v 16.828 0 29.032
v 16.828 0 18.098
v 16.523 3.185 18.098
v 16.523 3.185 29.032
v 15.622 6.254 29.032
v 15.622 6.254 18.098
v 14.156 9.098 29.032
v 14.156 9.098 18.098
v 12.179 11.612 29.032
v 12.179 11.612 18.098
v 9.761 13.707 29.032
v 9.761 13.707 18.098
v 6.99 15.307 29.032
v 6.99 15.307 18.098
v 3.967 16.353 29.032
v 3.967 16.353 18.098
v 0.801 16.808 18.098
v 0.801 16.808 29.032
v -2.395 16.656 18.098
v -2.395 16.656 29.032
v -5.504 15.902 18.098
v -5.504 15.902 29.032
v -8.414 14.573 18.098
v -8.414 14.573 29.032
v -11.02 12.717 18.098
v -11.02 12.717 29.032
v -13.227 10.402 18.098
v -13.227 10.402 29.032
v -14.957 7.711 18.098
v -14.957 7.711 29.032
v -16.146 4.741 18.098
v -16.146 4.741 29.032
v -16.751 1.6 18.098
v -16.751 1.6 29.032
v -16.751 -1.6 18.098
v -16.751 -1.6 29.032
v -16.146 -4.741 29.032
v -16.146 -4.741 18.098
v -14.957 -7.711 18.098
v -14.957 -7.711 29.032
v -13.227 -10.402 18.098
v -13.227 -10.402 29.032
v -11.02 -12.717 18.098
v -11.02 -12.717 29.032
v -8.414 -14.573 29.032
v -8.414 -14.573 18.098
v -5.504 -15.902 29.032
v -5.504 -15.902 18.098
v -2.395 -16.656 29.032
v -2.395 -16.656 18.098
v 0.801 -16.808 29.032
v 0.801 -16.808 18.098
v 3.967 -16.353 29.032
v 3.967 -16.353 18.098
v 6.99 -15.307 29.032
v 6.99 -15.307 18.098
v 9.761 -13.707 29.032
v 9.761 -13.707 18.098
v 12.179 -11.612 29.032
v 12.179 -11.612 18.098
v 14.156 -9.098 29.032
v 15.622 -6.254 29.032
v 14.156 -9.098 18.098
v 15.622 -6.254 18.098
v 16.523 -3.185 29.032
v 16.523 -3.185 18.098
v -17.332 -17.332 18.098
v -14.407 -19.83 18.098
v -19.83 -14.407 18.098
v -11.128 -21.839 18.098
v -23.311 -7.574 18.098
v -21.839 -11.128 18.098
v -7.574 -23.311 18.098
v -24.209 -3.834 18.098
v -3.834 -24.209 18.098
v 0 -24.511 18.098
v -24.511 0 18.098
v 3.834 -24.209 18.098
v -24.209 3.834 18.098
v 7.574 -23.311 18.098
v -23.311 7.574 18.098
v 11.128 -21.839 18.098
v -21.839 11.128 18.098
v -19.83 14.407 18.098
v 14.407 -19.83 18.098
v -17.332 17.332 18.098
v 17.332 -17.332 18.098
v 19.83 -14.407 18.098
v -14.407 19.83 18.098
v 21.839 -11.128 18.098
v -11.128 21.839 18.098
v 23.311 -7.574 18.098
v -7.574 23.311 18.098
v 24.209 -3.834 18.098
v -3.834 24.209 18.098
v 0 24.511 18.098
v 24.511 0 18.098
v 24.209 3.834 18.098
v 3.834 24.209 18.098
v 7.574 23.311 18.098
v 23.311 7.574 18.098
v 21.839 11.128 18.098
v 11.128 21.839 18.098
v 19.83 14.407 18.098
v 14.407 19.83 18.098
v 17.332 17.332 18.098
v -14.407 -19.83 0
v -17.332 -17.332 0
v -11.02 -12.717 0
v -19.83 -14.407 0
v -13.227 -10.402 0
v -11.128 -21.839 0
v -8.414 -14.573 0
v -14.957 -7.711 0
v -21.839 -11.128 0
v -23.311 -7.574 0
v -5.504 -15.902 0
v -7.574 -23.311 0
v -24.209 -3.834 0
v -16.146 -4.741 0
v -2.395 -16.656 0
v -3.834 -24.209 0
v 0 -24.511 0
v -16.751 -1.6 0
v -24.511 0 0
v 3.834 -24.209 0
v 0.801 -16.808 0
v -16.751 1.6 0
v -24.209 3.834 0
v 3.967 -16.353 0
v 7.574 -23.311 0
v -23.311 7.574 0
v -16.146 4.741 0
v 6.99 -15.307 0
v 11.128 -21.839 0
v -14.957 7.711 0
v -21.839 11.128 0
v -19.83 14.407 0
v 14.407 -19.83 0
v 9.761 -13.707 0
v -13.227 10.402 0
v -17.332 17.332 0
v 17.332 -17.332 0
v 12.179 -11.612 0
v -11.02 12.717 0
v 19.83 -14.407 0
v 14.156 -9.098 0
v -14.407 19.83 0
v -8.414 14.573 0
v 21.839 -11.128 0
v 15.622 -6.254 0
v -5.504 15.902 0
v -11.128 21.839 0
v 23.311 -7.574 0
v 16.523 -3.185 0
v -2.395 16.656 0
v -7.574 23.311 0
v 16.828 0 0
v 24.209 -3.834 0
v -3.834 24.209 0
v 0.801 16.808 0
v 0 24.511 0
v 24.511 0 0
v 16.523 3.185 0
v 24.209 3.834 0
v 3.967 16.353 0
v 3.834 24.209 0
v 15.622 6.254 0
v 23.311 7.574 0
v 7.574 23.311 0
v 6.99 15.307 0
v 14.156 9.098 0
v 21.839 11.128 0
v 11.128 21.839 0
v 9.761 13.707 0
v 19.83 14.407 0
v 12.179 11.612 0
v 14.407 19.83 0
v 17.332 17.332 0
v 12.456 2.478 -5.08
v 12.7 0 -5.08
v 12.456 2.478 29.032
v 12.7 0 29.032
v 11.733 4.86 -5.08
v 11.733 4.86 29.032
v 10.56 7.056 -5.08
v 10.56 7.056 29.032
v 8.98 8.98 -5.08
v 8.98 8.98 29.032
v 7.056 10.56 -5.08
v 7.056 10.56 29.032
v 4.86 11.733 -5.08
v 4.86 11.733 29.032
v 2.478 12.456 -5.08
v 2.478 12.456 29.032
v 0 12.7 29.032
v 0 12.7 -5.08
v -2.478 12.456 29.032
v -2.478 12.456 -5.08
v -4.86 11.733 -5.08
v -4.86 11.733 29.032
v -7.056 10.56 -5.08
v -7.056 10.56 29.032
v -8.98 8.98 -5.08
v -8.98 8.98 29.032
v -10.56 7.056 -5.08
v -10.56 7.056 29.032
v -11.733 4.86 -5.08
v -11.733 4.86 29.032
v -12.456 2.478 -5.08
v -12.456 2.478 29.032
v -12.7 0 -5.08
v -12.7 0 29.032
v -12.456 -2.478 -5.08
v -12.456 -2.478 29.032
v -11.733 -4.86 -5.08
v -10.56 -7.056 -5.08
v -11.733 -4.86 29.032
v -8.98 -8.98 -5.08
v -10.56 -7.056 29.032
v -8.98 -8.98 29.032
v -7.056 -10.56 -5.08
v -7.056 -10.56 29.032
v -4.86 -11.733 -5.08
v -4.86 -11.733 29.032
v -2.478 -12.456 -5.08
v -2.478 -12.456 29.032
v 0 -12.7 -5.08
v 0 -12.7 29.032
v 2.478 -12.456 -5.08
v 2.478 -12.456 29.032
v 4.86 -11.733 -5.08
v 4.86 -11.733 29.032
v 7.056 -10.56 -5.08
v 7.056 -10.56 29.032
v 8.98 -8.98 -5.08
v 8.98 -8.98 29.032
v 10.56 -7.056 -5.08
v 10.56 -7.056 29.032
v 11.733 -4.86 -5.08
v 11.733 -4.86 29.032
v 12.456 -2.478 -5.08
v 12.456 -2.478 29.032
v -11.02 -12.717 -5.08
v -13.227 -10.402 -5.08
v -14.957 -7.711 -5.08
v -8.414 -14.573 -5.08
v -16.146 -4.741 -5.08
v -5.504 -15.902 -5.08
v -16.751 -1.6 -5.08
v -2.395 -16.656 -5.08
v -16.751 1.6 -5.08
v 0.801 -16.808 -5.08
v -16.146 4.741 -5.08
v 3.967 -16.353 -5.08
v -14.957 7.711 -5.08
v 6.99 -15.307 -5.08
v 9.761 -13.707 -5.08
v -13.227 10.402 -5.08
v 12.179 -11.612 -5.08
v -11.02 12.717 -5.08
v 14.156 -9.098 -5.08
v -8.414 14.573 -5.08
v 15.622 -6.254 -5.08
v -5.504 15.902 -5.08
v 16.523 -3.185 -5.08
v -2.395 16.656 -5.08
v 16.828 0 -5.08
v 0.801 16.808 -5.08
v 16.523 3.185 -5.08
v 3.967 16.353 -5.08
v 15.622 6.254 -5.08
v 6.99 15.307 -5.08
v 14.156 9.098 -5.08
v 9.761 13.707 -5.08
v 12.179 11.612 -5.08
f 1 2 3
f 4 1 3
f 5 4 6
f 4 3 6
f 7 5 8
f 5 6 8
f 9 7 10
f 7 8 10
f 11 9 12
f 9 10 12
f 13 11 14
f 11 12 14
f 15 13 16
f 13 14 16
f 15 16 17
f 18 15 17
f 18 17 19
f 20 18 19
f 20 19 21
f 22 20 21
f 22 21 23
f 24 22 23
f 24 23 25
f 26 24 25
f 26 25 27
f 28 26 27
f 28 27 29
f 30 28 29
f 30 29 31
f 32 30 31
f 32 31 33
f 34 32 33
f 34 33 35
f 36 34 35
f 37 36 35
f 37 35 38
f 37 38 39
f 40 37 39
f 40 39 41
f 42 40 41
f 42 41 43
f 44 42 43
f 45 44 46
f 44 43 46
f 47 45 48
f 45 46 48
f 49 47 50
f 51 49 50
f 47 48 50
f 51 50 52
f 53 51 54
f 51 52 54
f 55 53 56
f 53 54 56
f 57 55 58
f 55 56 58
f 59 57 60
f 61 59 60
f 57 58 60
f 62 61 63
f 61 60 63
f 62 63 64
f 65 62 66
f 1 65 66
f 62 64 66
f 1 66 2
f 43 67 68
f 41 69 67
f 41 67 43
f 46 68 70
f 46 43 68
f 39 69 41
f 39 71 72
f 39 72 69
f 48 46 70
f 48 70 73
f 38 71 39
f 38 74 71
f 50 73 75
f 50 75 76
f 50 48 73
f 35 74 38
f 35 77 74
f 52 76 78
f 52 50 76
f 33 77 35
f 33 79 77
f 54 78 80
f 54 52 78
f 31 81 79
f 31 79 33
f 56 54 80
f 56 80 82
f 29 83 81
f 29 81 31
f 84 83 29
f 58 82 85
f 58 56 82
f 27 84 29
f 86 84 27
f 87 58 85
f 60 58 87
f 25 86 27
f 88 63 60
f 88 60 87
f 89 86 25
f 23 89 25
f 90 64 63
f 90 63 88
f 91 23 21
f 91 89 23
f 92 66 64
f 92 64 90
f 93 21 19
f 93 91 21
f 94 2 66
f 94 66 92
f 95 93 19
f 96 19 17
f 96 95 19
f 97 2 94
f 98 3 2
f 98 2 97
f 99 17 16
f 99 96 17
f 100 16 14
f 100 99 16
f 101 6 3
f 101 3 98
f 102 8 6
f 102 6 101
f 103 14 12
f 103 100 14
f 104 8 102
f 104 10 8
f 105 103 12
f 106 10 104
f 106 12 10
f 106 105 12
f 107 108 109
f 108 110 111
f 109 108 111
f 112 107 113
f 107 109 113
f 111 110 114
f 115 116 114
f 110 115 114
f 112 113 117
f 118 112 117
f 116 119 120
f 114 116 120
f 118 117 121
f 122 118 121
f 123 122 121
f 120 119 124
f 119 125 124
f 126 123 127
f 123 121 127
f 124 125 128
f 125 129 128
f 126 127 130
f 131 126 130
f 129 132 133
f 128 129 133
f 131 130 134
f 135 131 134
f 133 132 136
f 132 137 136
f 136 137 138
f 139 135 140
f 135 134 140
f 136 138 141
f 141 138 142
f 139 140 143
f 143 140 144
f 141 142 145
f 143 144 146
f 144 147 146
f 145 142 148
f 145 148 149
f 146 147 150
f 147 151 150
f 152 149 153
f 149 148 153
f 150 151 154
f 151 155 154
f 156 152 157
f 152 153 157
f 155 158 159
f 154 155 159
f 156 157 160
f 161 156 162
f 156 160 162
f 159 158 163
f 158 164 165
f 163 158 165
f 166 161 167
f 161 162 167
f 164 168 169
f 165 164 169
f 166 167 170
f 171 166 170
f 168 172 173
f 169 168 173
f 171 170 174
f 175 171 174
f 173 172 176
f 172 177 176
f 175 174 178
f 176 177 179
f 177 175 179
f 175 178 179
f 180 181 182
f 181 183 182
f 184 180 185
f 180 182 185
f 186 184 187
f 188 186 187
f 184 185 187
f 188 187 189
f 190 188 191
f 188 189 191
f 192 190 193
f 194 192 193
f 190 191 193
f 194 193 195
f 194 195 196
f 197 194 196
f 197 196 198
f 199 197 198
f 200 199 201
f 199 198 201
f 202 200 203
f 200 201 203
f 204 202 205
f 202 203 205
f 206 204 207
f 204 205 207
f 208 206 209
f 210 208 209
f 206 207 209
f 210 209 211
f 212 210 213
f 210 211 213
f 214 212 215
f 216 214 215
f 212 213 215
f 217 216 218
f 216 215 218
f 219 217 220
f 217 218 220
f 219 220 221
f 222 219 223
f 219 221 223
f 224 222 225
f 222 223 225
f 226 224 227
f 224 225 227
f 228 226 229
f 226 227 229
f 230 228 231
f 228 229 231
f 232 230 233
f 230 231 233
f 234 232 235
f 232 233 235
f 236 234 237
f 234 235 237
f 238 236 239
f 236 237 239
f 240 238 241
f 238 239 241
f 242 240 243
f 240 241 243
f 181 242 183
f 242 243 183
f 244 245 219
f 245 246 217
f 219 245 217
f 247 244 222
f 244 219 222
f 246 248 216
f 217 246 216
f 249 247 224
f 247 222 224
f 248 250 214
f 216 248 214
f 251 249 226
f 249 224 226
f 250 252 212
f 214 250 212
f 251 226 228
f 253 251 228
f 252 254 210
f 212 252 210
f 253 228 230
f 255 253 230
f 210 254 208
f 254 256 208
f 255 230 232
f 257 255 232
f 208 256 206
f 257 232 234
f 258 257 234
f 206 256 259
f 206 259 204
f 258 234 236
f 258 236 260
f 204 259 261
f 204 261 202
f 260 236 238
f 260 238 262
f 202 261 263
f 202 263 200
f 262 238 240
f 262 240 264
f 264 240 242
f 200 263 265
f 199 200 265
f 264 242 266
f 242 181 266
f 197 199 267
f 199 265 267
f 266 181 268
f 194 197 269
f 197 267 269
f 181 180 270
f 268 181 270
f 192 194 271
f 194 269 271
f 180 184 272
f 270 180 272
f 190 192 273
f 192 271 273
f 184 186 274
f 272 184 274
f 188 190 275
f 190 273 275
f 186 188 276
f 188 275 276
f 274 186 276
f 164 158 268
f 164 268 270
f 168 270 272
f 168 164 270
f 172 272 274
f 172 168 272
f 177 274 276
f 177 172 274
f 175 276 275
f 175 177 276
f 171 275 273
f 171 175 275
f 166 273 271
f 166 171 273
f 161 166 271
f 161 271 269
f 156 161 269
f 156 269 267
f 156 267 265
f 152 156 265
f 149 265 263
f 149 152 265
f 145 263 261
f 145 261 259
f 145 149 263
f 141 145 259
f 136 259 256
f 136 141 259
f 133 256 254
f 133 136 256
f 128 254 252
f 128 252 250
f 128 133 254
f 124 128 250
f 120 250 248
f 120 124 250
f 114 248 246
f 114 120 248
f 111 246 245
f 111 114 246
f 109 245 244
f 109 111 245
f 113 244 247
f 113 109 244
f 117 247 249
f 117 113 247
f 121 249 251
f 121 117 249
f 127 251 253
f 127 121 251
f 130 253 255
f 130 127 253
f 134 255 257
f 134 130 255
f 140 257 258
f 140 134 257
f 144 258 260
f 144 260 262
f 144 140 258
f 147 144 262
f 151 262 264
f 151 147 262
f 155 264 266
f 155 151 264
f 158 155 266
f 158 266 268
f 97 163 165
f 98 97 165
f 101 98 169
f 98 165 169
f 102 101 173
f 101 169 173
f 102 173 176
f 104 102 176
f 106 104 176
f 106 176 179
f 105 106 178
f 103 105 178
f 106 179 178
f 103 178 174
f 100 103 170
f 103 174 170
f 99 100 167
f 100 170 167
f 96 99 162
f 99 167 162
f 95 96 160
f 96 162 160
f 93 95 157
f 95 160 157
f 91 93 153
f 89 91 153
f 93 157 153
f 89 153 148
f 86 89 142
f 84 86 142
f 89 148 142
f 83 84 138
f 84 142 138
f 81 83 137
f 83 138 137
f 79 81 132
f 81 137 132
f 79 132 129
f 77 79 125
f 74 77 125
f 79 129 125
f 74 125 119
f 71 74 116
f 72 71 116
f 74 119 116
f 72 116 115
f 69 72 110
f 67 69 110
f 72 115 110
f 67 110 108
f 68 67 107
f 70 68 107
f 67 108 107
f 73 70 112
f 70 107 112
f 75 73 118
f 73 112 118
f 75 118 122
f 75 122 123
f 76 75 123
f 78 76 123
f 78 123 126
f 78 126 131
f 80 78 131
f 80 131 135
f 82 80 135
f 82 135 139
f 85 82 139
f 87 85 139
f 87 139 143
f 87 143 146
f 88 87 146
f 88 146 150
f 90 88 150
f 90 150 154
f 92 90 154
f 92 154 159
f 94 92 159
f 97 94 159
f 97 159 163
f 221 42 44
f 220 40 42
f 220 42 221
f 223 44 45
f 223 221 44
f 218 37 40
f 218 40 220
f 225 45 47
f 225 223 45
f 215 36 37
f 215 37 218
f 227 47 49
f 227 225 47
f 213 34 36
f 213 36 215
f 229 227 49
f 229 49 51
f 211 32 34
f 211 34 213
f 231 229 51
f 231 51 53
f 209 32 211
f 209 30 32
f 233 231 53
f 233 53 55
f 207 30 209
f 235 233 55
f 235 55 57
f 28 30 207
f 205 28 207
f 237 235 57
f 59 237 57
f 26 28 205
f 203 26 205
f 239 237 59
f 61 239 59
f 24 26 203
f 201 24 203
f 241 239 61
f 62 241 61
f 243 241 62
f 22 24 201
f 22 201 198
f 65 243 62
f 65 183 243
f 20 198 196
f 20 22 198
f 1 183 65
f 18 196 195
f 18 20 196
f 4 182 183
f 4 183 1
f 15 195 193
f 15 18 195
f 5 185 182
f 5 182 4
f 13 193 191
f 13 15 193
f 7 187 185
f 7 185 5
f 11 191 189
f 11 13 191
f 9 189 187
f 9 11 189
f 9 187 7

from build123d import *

# Parameters (mm, degrees)
F0_R          = 24.511
F0_R_2        = 16.8275
F0_R_3        = 12.7
F1_DEPTH      = 18.0975
F2_DEPTH      = 29.0322
F2_DEPTH_BACK = 5.08
F3_DEPTH      = 29.0332


with BuildPart() as f1:
    # F0 (on Top) → F1 (new body)
    with BuildSketch(Plane.XY):
        Circle(F0_R)
        Circle(F0_R_2, mode=Mode.SUBTRACT)
        Circle(F0_R_2)
        Circle(F0_R_3, mode=Mode.SUBTRACT)
        Circle(F0_R_3)
    extrude(amount=F1_DEPTH)

    # F0 (on Top) → F2 (join, two sides)
    with BuildSketch(Plane.XY) as f2_sk:
        Circle(F0_R_2)
        Circle(F0_R_3, mode=Mode.SUBTRACT)
    extrude(amount=F2_DEPTH)
    extrude(f2_sk.sketch, amount=-F2_DEPTH_BACK)

    # F3 (cut, through all): a face of the model
    f3_faces = [f1.faces().sort_by_distance(p)[0] for p in [
        (0, 0, 0),
    ]]
    extrude(f3_faces, amount=-F3_DEPTH, mode=Mode.SUBTRACT)


solid = f1.part
